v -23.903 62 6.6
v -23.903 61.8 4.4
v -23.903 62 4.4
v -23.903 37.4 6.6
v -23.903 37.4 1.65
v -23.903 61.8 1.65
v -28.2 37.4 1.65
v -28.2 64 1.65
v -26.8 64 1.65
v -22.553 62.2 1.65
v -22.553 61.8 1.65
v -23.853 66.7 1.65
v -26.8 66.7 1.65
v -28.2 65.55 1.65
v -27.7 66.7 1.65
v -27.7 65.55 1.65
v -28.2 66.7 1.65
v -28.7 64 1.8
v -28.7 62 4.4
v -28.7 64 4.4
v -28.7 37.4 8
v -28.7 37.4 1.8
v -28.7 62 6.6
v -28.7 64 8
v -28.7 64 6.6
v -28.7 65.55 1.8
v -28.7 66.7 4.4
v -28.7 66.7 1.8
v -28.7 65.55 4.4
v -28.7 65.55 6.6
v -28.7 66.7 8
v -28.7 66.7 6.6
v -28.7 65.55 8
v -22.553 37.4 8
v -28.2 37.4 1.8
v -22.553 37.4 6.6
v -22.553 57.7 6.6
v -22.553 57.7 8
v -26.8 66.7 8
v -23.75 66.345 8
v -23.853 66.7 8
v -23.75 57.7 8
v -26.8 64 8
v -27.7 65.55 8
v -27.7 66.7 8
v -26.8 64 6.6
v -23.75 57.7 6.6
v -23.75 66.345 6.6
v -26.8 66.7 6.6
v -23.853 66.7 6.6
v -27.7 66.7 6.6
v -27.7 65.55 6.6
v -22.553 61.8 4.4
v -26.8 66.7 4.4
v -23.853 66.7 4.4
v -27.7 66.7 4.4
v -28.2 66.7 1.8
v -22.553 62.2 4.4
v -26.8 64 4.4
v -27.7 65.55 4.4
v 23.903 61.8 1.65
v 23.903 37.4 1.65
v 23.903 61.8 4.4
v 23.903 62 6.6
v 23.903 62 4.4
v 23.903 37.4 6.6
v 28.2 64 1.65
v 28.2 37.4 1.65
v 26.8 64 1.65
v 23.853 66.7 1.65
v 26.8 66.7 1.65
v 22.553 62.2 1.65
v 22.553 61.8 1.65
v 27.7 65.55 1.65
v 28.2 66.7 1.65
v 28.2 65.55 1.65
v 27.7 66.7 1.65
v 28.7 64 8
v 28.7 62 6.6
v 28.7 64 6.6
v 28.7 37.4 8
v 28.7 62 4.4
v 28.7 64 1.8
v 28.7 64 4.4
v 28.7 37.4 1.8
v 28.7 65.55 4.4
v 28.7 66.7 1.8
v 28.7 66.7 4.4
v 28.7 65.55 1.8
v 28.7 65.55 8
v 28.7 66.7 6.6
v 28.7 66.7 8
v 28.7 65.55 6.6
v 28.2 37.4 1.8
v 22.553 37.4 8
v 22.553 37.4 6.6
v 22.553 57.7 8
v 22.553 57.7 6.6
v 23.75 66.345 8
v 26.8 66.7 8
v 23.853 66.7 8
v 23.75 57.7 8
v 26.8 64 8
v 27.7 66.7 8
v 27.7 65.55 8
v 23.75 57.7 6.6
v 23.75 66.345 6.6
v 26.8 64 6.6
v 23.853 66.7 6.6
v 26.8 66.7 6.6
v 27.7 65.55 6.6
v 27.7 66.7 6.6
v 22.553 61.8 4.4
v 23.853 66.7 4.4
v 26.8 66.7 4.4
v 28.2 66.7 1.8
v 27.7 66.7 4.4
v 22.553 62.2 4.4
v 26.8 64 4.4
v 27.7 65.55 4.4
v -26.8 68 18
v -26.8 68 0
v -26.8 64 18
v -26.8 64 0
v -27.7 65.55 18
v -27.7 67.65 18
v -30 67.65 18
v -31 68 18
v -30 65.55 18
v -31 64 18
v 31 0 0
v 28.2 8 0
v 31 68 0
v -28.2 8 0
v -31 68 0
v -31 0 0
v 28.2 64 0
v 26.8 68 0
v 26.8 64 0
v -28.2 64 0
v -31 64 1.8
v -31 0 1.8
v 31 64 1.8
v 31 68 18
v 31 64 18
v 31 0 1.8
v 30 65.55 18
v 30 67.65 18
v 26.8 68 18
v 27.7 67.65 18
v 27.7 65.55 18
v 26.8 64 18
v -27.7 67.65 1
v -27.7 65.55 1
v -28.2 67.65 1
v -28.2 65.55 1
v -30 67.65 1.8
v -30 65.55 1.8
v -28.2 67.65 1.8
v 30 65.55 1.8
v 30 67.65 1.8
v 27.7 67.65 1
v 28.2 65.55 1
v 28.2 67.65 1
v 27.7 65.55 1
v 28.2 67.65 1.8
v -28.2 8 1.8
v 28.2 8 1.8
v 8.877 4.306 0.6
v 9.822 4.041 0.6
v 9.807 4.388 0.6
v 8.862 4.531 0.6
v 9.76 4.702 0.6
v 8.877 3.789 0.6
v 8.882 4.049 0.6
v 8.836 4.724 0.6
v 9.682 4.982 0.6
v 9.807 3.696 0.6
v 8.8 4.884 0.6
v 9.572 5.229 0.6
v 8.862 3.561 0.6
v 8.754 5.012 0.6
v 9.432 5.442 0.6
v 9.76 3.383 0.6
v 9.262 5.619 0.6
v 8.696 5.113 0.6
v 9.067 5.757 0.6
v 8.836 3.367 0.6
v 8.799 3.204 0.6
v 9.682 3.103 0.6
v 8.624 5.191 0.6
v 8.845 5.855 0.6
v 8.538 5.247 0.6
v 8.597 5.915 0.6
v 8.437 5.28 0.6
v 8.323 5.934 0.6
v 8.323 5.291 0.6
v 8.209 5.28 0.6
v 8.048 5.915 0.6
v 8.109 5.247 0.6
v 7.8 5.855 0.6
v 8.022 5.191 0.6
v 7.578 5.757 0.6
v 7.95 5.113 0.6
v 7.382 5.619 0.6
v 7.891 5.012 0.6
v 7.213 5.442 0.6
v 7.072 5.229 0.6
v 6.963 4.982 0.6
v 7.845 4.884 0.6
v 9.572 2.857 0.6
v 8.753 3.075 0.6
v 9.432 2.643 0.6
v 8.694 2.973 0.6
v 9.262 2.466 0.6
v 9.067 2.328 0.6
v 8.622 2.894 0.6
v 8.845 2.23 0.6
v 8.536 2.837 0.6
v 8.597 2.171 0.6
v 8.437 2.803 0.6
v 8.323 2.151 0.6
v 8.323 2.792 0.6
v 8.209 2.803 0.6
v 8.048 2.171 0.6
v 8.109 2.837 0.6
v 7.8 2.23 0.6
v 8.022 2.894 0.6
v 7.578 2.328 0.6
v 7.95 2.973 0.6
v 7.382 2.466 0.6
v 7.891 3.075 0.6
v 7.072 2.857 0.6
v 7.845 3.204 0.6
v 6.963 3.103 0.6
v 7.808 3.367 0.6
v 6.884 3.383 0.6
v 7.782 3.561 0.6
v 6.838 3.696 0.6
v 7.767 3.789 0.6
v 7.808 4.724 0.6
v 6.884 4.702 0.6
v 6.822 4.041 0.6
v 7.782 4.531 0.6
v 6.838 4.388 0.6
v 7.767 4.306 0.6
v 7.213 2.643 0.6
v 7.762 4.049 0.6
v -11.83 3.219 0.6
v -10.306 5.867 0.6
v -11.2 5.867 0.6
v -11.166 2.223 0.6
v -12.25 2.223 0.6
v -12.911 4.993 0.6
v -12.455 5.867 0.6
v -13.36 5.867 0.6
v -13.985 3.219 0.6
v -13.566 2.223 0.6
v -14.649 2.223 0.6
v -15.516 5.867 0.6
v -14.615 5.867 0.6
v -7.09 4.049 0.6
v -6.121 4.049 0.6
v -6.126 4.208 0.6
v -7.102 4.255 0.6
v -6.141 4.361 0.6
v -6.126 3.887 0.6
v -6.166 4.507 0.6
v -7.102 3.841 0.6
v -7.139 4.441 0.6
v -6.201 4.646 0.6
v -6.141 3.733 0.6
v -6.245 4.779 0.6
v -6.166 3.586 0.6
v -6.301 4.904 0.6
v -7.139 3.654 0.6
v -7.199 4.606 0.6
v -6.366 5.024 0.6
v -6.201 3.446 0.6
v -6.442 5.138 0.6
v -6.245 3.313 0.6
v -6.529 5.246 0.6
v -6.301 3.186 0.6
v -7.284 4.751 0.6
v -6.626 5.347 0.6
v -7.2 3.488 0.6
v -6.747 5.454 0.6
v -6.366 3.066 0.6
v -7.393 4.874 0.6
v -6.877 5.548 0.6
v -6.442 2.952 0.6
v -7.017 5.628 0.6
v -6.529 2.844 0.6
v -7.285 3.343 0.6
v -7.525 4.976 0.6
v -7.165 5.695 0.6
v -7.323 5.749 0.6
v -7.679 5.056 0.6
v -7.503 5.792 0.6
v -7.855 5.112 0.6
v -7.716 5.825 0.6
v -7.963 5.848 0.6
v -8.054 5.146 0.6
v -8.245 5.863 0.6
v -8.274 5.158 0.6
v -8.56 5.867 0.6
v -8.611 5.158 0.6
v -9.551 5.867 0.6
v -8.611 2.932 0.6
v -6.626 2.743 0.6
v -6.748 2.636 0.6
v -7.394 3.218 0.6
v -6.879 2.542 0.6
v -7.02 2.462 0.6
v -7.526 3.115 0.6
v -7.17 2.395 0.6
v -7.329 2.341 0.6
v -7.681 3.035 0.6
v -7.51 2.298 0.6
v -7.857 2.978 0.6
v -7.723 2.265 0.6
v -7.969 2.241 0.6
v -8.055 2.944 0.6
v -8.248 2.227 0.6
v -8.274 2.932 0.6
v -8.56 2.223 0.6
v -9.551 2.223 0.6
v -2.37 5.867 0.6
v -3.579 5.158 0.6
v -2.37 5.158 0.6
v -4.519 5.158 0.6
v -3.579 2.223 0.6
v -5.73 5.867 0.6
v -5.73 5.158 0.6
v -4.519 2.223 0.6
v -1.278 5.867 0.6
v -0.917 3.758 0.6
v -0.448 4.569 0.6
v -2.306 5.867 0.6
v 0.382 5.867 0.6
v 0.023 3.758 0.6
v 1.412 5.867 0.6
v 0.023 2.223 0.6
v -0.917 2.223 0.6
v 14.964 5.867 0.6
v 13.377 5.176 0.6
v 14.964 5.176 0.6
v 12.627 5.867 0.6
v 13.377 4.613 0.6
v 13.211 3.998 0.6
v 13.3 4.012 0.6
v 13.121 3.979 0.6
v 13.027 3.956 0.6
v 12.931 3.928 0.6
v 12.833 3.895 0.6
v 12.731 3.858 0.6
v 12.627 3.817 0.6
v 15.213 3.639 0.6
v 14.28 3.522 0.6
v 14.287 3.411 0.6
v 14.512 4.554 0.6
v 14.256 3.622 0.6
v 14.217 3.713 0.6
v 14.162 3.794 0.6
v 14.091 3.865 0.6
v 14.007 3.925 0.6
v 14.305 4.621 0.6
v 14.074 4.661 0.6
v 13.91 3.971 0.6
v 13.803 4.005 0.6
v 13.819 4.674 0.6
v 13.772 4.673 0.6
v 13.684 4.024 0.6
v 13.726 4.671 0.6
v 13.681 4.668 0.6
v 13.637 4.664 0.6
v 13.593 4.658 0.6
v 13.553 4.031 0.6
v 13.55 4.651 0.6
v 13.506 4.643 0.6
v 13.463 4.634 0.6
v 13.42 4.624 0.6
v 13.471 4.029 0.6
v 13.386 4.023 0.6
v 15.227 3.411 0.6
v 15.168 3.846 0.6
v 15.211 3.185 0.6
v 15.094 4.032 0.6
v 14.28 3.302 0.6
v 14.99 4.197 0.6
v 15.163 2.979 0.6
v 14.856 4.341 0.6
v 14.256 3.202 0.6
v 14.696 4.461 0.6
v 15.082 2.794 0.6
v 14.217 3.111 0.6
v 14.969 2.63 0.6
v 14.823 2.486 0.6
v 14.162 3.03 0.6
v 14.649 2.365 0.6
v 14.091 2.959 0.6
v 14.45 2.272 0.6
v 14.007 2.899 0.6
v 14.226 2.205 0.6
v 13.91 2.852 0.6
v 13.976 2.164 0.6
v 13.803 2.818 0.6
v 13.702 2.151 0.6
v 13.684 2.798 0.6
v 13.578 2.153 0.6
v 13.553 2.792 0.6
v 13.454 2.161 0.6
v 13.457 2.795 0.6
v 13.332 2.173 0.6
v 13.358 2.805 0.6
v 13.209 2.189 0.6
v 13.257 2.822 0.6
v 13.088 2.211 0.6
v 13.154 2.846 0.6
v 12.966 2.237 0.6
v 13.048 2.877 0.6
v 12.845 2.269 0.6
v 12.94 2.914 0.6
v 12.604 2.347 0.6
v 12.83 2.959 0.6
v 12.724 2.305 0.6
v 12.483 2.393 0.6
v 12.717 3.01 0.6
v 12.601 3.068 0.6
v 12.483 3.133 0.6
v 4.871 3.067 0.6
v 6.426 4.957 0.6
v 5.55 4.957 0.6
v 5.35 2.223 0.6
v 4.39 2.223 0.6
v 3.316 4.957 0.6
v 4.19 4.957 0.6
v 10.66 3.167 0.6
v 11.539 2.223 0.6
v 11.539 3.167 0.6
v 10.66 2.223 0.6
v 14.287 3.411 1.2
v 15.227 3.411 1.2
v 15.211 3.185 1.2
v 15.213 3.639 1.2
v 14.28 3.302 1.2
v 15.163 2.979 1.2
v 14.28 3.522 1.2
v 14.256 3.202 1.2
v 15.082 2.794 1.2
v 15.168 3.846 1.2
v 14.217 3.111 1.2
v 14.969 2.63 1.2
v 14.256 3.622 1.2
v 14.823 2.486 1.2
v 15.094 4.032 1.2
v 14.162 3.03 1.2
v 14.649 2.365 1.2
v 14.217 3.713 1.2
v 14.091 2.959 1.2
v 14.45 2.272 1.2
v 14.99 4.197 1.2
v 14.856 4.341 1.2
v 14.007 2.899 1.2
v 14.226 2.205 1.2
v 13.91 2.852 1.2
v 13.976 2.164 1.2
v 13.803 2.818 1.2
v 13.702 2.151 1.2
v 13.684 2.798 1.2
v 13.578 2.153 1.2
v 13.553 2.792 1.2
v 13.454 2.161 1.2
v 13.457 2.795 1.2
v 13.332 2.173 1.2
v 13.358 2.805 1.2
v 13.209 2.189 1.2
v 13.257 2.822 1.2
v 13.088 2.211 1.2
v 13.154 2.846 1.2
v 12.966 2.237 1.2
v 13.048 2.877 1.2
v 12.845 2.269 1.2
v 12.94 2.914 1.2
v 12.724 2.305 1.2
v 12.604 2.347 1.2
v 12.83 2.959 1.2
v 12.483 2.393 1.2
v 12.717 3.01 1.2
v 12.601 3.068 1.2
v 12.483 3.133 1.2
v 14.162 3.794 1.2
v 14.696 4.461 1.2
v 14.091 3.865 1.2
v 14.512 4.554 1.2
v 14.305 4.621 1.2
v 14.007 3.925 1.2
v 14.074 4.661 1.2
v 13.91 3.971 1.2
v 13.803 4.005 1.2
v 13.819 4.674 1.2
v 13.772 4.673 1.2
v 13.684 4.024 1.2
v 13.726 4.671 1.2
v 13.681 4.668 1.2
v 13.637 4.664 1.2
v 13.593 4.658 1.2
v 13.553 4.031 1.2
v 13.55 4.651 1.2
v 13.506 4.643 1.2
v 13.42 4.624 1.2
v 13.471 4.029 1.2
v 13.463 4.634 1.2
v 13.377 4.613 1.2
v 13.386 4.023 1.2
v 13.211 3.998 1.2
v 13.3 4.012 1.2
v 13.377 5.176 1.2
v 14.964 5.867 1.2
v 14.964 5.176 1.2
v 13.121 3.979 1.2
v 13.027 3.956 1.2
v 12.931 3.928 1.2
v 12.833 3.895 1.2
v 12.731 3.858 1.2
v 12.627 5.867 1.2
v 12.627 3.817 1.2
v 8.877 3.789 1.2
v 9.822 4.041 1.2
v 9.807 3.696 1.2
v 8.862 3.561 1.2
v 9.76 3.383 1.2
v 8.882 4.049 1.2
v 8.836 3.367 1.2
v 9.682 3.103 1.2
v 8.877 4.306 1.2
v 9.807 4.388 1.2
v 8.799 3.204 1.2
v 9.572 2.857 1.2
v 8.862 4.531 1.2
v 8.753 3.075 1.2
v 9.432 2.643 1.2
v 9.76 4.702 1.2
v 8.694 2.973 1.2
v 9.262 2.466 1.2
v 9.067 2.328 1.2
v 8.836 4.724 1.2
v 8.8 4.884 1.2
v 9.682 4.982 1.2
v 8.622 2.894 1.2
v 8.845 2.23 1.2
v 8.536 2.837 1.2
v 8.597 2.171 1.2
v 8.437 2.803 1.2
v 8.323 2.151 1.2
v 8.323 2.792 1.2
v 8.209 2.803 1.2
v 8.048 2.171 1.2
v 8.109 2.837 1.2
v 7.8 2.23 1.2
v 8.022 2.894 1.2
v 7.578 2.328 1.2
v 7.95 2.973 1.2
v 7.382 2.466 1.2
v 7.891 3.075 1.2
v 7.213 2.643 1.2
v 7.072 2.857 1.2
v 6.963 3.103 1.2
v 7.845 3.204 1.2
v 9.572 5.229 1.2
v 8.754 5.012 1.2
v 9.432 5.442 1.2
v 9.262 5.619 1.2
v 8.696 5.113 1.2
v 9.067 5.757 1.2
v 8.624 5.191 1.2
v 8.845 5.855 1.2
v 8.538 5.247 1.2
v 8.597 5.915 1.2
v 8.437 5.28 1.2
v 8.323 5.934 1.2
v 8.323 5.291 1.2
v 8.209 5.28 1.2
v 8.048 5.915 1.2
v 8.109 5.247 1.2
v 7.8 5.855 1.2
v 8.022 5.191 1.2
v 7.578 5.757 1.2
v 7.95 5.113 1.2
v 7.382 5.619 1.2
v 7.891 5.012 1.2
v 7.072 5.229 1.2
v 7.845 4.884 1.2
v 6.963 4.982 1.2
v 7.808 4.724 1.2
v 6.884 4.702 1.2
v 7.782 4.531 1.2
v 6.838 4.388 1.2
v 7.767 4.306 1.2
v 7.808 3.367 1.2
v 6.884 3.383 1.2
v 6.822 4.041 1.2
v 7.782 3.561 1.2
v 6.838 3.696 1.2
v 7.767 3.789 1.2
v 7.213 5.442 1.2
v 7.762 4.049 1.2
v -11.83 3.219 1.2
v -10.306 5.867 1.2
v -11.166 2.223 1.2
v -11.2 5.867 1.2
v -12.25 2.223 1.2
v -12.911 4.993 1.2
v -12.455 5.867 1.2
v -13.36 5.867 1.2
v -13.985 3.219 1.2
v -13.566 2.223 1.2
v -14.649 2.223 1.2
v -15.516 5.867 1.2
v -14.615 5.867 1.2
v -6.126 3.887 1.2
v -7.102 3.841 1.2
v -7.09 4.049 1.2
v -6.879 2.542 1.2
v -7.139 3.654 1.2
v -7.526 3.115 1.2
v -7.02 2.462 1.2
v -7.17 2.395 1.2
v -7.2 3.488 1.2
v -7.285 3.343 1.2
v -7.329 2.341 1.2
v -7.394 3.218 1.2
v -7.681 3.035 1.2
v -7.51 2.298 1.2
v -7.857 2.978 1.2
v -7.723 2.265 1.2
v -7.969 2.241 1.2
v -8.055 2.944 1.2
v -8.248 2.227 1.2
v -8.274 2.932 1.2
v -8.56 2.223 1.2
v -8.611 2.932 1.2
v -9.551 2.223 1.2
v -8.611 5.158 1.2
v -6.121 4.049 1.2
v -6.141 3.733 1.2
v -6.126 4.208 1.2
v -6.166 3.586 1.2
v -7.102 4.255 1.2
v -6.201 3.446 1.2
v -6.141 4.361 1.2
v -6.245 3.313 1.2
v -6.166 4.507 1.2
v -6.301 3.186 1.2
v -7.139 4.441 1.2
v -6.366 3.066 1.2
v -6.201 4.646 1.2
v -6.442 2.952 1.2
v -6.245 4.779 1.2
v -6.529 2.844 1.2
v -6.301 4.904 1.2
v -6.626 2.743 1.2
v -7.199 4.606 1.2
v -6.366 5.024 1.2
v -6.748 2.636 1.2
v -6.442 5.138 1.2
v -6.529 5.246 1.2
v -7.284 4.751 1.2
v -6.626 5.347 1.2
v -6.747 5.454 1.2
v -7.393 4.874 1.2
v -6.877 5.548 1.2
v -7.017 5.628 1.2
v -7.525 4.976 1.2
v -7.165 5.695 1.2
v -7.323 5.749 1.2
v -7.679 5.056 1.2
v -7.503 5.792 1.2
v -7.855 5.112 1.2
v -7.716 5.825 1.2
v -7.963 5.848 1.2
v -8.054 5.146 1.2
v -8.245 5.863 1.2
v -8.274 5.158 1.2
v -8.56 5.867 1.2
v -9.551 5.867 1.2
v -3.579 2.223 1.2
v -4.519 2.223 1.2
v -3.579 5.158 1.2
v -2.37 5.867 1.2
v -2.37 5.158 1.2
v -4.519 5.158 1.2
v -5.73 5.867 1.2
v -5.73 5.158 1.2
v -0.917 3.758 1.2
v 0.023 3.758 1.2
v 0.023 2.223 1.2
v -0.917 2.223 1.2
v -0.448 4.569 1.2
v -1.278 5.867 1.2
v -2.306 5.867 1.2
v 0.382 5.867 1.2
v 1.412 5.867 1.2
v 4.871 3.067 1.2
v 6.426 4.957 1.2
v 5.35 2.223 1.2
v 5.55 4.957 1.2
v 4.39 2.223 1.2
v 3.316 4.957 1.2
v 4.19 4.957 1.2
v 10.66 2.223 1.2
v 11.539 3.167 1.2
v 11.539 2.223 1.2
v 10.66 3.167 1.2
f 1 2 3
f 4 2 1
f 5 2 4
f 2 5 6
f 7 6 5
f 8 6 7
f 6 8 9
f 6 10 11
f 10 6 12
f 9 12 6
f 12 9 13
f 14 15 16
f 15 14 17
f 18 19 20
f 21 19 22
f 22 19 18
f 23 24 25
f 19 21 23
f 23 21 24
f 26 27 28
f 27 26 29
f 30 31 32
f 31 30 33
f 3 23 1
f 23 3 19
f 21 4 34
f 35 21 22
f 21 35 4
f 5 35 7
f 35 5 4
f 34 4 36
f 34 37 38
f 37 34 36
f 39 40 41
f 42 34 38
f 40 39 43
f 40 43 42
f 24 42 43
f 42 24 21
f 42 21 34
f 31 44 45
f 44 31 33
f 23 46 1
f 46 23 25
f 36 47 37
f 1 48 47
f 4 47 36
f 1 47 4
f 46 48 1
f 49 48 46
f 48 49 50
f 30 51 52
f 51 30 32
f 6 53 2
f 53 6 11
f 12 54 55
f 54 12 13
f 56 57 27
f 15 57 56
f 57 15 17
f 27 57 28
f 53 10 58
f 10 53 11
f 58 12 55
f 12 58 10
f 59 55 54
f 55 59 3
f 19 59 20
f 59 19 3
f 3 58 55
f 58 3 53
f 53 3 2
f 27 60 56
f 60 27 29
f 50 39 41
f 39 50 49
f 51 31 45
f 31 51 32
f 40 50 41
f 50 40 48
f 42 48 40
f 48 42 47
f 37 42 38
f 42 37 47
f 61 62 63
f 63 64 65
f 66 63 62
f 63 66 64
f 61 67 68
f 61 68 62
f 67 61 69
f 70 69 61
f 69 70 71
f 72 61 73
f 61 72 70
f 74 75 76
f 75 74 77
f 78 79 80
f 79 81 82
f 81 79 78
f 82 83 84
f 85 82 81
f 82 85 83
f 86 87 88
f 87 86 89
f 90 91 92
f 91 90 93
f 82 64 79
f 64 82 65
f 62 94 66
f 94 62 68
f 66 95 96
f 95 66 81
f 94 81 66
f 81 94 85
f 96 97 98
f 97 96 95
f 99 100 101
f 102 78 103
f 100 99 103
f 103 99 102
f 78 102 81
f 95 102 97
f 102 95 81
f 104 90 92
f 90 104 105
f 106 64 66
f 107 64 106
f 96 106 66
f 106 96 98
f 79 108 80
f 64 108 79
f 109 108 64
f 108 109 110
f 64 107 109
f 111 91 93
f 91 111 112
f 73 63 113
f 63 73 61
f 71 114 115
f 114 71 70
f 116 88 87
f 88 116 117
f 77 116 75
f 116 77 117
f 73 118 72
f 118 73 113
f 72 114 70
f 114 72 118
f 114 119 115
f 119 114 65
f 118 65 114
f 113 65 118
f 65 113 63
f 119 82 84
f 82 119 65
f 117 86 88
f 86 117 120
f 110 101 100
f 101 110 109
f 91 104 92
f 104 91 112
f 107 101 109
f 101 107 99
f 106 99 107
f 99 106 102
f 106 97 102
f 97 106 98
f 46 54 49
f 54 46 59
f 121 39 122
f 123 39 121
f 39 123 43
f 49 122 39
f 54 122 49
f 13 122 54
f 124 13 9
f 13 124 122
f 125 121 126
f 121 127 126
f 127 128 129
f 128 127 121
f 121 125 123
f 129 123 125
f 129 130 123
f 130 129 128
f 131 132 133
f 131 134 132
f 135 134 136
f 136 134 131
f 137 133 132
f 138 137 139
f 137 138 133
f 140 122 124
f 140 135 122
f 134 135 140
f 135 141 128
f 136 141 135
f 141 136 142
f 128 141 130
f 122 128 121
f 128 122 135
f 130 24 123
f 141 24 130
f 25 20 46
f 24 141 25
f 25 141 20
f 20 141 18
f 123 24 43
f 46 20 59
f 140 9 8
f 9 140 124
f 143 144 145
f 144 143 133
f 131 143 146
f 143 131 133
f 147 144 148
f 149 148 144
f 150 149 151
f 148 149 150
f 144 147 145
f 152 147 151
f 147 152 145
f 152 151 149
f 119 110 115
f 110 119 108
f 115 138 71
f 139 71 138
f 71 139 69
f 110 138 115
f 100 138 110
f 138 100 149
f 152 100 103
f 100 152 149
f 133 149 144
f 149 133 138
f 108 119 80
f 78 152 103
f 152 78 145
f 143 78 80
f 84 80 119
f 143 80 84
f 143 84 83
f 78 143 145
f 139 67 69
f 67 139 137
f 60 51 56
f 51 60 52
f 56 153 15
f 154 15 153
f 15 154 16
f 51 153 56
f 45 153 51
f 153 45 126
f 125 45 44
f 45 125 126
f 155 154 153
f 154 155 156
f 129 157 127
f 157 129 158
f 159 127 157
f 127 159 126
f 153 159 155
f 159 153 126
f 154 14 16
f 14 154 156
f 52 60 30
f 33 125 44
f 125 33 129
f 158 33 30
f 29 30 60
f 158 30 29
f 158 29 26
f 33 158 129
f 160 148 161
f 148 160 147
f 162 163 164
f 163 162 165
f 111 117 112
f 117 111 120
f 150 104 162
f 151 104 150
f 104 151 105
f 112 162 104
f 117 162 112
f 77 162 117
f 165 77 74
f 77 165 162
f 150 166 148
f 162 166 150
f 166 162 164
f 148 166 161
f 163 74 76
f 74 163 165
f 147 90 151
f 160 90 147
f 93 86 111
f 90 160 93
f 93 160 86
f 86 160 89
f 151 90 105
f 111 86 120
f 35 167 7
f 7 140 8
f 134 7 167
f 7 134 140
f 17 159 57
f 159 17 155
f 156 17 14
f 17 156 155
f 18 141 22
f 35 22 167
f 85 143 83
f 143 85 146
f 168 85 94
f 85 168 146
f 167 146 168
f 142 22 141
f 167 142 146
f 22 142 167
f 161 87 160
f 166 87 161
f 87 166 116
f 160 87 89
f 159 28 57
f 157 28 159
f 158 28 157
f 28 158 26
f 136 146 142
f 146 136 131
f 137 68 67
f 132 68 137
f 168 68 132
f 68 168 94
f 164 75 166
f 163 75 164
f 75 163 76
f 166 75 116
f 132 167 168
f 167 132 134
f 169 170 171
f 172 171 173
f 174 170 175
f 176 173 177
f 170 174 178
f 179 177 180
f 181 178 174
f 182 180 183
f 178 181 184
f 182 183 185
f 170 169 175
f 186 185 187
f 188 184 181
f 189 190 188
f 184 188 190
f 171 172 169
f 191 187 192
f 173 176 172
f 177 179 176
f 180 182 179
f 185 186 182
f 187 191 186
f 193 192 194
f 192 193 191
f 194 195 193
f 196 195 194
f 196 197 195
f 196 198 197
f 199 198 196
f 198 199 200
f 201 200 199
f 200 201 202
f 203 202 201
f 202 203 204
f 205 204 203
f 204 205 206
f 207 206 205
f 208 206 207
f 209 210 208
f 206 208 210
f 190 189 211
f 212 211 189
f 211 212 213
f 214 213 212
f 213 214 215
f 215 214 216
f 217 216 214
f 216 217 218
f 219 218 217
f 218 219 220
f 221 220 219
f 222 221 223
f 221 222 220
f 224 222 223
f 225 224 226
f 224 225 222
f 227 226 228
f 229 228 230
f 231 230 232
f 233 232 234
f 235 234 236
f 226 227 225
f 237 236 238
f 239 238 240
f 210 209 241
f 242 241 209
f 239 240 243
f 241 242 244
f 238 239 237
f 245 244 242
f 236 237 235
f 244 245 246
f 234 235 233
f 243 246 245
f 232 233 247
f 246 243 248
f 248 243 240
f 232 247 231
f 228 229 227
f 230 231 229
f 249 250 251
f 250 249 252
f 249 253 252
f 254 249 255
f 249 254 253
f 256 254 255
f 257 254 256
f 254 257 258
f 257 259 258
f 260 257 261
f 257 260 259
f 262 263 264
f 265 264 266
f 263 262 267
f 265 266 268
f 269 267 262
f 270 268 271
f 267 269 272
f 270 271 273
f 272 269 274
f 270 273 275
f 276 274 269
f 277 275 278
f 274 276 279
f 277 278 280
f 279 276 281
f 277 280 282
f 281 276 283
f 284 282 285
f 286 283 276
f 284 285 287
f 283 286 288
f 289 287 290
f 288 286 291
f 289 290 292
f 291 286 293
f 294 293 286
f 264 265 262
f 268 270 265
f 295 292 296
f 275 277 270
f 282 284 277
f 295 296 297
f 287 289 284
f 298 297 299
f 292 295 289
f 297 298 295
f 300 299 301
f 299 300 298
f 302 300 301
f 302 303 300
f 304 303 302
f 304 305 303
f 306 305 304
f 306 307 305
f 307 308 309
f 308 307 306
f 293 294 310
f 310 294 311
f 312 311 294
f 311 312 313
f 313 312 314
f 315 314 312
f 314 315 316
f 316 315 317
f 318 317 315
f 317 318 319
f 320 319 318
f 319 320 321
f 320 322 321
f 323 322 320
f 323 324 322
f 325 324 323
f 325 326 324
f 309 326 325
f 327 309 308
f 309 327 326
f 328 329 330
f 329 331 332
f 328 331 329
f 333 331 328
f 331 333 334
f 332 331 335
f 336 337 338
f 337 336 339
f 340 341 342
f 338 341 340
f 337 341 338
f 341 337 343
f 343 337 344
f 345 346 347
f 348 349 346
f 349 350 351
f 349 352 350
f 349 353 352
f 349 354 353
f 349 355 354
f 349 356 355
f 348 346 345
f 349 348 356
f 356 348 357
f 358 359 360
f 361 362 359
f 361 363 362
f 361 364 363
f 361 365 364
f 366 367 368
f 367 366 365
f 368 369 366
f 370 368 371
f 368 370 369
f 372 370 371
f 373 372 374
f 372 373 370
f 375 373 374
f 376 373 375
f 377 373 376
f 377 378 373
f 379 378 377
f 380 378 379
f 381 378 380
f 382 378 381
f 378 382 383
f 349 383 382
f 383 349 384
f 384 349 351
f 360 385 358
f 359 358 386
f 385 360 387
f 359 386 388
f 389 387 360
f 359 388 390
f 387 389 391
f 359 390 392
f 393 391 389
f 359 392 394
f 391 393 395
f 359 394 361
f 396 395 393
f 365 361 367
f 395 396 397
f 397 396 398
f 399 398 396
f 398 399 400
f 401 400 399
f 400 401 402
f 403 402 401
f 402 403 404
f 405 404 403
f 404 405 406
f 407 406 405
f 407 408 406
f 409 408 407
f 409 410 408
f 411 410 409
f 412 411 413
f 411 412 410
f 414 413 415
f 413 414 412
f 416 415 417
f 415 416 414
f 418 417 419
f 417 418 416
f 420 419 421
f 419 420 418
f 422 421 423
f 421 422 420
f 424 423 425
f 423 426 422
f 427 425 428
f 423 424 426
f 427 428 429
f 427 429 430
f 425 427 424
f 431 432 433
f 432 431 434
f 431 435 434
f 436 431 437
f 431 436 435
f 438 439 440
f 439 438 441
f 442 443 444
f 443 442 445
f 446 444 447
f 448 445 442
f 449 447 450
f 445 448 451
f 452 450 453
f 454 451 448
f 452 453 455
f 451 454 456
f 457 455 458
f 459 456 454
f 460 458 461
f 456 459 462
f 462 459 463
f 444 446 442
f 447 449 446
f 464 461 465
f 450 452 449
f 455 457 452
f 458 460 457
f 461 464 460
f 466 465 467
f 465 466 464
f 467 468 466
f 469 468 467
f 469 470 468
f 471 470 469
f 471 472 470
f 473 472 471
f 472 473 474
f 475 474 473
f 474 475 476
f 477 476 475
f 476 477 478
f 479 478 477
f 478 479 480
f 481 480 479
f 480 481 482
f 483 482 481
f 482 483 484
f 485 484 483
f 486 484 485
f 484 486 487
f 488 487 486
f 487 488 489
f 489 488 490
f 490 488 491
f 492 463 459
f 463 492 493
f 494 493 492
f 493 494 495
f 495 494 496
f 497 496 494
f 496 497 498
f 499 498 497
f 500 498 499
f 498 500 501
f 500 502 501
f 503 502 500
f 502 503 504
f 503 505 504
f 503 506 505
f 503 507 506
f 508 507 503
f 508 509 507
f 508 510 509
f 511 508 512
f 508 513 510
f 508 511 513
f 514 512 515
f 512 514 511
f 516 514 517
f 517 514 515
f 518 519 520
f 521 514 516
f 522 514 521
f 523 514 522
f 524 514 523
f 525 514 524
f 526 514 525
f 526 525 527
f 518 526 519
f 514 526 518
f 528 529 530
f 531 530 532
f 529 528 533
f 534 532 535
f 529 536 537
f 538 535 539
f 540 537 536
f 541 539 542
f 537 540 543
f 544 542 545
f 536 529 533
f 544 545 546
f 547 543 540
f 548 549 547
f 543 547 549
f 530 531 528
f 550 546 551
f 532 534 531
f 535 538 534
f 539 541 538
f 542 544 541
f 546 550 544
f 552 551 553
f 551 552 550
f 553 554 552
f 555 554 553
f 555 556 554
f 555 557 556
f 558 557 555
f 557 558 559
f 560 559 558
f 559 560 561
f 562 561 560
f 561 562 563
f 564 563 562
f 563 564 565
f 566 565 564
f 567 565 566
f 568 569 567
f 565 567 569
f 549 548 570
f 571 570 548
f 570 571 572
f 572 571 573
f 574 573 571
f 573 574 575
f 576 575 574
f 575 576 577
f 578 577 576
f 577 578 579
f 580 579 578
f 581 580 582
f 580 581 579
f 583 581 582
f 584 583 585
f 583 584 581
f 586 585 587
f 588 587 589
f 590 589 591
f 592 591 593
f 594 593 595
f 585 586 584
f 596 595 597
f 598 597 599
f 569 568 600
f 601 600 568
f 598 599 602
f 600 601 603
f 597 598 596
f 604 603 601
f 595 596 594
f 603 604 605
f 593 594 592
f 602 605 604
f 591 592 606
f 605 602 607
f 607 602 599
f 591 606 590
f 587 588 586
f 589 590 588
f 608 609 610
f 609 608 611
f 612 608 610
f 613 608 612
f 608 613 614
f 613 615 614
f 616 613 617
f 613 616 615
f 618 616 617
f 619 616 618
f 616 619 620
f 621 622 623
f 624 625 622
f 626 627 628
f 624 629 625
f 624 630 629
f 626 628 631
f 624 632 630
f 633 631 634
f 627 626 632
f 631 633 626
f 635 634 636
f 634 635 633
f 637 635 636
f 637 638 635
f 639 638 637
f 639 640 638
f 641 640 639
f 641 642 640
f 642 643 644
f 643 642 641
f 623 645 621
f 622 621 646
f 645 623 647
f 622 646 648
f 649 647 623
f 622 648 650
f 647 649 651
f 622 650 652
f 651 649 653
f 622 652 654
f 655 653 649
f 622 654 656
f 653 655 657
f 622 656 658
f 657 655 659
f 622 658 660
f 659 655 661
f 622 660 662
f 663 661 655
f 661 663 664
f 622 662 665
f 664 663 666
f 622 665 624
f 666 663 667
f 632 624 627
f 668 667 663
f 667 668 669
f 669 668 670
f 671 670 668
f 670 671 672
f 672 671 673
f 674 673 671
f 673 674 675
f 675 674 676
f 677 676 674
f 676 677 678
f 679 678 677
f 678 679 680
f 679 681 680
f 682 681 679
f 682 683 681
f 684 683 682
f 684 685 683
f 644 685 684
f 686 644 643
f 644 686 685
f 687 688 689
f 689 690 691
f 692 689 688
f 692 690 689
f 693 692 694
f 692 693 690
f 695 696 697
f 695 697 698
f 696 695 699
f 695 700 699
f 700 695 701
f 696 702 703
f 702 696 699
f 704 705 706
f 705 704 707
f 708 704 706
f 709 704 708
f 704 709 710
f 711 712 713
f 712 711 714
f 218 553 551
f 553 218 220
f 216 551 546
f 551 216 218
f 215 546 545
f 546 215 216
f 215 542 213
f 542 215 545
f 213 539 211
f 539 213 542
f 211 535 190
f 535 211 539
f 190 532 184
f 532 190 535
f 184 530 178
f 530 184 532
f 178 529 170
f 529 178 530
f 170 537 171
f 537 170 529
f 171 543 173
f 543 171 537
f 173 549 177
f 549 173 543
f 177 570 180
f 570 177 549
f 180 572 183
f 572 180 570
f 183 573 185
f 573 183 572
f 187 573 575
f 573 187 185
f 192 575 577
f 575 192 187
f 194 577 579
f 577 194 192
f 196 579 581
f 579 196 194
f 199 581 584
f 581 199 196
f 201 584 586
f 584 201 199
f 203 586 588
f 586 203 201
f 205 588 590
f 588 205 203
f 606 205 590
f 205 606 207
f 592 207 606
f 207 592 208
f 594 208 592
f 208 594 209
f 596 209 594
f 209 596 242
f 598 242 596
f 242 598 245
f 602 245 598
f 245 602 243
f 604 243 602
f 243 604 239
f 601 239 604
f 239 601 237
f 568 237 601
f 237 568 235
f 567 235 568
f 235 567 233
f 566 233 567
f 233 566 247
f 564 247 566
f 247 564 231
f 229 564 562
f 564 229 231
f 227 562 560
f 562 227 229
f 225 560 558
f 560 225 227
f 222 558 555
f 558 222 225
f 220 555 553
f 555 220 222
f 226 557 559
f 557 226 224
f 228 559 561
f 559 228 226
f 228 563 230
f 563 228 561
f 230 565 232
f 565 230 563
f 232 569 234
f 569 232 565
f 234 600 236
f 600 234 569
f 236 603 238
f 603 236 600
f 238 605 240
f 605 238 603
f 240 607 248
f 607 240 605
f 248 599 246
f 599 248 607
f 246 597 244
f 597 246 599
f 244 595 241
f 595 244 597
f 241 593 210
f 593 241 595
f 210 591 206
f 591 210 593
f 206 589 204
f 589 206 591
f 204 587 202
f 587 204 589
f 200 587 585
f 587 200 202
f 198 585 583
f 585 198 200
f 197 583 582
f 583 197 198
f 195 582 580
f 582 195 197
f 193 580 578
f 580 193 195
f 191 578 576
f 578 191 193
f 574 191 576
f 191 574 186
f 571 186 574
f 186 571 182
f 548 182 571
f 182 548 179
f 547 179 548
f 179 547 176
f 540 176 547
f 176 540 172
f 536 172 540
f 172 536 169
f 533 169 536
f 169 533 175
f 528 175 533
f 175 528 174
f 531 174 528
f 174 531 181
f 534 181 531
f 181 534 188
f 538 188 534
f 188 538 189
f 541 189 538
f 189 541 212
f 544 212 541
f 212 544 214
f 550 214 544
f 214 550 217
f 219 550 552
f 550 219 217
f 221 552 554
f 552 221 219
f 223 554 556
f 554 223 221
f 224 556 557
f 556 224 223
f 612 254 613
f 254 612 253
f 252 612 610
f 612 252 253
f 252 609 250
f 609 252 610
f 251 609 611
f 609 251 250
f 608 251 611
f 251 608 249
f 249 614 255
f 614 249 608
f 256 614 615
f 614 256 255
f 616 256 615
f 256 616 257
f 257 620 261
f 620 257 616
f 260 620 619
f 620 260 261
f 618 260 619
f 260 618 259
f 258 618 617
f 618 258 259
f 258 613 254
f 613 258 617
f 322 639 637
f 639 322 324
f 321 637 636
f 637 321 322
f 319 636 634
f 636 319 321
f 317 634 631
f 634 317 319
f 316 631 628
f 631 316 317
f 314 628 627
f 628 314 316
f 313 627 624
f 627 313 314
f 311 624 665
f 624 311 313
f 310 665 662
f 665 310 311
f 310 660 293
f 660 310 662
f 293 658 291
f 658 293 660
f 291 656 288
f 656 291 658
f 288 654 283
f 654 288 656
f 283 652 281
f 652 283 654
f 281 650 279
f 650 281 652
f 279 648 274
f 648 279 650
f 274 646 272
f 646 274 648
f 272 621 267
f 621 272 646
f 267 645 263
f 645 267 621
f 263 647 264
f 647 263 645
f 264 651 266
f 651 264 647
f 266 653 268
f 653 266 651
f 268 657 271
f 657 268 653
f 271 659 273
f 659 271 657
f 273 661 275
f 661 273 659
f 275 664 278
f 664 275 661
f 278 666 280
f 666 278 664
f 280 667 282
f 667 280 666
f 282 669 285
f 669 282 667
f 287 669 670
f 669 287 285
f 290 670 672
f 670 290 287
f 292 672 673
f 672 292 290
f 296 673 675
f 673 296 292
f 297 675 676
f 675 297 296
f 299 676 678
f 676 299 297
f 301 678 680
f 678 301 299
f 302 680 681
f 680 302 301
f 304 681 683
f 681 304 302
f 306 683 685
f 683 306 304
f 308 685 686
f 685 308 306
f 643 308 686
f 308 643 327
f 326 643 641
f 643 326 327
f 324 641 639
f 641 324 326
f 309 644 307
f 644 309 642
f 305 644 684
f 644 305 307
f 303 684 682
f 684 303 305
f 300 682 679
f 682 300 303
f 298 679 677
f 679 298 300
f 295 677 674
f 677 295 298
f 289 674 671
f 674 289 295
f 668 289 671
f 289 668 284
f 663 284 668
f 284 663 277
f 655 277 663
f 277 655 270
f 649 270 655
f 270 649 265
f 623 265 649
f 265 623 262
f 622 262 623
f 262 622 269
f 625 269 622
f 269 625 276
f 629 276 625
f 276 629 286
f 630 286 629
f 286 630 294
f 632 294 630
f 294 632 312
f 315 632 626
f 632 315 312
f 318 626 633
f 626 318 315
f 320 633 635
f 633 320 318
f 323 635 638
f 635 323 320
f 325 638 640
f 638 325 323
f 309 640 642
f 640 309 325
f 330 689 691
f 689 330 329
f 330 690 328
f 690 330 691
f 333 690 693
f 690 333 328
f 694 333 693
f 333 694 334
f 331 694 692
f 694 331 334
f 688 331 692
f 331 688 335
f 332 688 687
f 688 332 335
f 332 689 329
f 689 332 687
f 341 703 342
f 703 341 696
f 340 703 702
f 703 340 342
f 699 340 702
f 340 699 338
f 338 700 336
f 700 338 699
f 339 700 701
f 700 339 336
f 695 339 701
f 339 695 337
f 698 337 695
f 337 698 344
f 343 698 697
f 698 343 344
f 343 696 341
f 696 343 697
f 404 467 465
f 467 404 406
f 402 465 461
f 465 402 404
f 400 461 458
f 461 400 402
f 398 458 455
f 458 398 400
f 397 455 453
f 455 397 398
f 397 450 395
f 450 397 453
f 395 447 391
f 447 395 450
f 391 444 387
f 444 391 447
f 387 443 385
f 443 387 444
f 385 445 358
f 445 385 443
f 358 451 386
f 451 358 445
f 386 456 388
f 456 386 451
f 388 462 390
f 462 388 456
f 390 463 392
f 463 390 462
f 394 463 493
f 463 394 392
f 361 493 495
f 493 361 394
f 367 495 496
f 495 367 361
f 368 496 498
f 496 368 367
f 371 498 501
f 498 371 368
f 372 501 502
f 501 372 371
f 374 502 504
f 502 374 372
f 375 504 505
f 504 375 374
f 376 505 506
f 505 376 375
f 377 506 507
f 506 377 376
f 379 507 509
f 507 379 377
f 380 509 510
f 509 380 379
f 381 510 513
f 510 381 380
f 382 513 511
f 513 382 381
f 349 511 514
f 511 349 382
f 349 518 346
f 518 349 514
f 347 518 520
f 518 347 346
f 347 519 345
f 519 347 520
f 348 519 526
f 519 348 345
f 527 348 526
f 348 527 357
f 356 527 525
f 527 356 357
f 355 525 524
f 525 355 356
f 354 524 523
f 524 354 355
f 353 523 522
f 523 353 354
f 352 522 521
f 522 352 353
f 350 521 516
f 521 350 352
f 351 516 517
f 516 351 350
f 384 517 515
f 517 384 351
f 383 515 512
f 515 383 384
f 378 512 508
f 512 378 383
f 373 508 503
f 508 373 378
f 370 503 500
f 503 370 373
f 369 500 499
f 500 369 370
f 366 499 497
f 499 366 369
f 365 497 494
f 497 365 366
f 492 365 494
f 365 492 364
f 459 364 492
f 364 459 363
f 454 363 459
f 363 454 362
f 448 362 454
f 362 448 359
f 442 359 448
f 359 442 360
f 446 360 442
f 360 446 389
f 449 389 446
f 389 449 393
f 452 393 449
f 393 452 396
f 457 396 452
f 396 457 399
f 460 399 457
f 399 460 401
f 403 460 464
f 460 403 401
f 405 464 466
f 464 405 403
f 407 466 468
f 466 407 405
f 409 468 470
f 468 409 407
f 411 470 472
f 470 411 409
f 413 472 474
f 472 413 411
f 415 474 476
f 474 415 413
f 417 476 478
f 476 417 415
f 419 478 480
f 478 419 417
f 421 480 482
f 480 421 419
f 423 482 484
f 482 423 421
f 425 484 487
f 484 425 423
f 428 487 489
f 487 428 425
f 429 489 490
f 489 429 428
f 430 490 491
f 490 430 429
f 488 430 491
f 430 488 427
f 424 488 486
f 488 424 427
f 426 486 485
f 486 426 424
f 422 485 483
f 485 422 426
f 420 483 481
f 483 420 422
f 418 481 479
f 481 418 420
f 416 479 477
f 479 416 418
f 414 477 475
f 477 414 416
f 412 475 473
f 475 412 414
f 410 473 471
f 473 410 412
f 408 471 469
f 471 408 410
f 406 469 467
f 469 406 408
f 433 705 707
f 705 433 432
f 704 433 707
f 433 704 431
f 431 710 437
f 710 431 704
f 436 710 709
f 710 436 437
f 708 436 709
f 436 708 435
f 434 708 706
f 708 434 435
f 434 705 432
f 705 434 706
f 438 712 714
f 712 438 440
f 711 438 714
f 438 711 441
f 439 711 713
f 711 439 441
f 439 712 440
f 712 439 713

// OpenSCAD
// v0.5 rear-bay fit test for the iodeo ESP Minitel V2 JST board.
// Units: mm. This fixture validates insertion and cable routing before the
// geometry is integrated into another full Minitel body print.

include <../../../../src/pcb_reference.scad>

part = "fixture"; // fixture, coupon, retainer, retainer_assembly, pcb, pcb_bare, components, cable, assembly, position_interference, route_interference
sweep_offset = 0;
$fn = 36;

// Measured hardware and Gerber-derived board dimensions.
pcb_length = 47.10521;
pcb_depth = 36.21792;
pcb_thickness = 1.60;
populated_height = 10.40;

// The USB-C side is the rear/trailing edge. Its metal shell is modelled as
// projecting 4 mm beyond the PCB for routing review, not as a fit datum.
pcb_rear_y = 60.0;
usb_outer_y = 64.0;
loop_front_y = 4.0;
route_depth = usb_outer_y - loop_front_y; // owner-selected 60 mm

pcb_z = 4.70;
slot_vertical_clearance = 0.30;
slot_side_clearance = 0.35;
// One millimetre is enough to carry the 1.6 mm PCB edge while keeping the
// nearby ESP32 module clear on the underside.
edge_capture = 1.00;

// Creality K2 baseline: 0.4 mm nozzle and 0.20 mm layers. Structural walls
// are multiples of practical line widths; the hidden mark spans three layers.
fixture_half_w = 31.0;
fixture_front_y = 0.0;
fixture_rear_y = 68.0;
base_h = 1.80;
rail_front_y = 37.40;
rail_rear_y = 62.00;
rail_mouth_y = 66.50;
rail_top_z = 8.00;
rail_outer_x = 28.70;

// Provisional until the cable is measured. The open fixture remains usable
// with a larger cable; this value controls only the visual routing reference.
cable_d = 5.0;
cable_z = rail_top_z + cable_d/2 + 0.20;

watermark_text = "WDTY v0.5";
watermark_z = 0.60;
watermark_h = 0.60;

board_edge_x = pcb_length/2;
slot_wall_x = board_edge_x + slot_side_clearance;
lip_inner_x = board_edge_x - edge_capture;
slot_bottom_z = pcb_z - slot_vertical_clearance;
slot_top_z = pcb_z + pcb_thickness + slot_vertical_clearance;

module placed_pcb(offset_y=0, thickness=pcb_thickness) {
    // Gerber (x,y) -> fixture (y,x): the USB/JST axis becomes front-to-rear.
    translate([-pcb_length/2, pcb_rear_y-18.11024+offset_y, pcb_z])
        mirror([1,0,0]) rotate([0,0,90])
            linear_extrude(height=thickness) pcb_reference_2d();
}

module left_rail(y0=rail_front_y, y1=rail_rear_y, mouth_y=rail_mouth_y) {
    // C-channel facing the PCB. Only the bare board edge enters the slot.
    difference() {
        union() {
            translate([-rail_outer_x,y0,base_h-0.15]) cube([rail_outer_x-slot_wall_x,y1-y0,slot_bottom_z-base_h+0.15]);
            translate([-rail_outer_x,y0,slot_top_z]) cube([rail_outer_x-lip_inner_x,y1-y0,rail_top_z-slot_top_z]);
            translate([-rail_outer_x,y0,slot_bottom_z]) cube([rail_outer_x-slot_wall_x,y1-y0,slot_top_z-slot_bottom_z]);

            // A flared mouth helps the broad USB-side edge find both slots.
            hull() {
                translate([-rail_outer_x,y1-0.20,base_h-0.15]) cube([rail_outer_x-lip_inner_x,0.40,slot_bottom_z-base_h+0.15]);
                translate([-rail_outer_x,mouth_y-0.20,base_h-0.15]) cube([rail_outer_x-(lip_inner_x+1.30),0.40,slot_bottom_z-base_h+0.15]);
            }
            hull() {
                translate([-rail_outer_x,y1-0.20,slot_top_z]) cube([rail_outer_x-lip_inner_x,0.40,rail_top_z-slot_top_z]);
                translate([-rail_outer_x,mouth_y-0.20,slot_top_z]) cube([rail_outer_x-(lip_inner_x+1.30),0.40,rail_top_z-slot_top_z]);
            }
        }

        // RESET sits very close to this board edge. This window keeps its
        // entire insertion path free while the remaining lip retains the PCB.
        translate([-23.75,57.70,slot_top_z-0.10])
            cube([4.75,mouth_y-57.50,rail_top_z-slot_top_z+0.20]);
    }
}

module right_rail(y0=rail_front_y, y1=rail_rear_y, mouth_y=rail_mouth_y) {
    mirror([1,0,0]) left_rail(y0,y1,mouth_y);
}

module rear_sockets() {
    // Vertical grooves accept the removable retainer after PCB insertion.
    difference() {
        union() {
            translate([-fixture_half_w,64.0,0]) cube([4.2,4.0,18.0]);
            translate([fixture_half_w-4.2,64.0,0]) cube([4.2,4.0,18.0]);
        }
        translate([-fixture_half_w+1.0,65.55,1.0]) cube([2.3,2.10,18.0]);
        translate([fixture_half_w-3.3,65.55,1.0]) cube([2.3,2.10,18.0]);
    }
}

module hidden_watermark(y=4.0) {
    // Enclosed void: 3 x 0.20 mm layers below, in, and above the mark.
    translate([0,y,watermark_z])
        linear_extrude(height=watermark_h)
            text(watermark_text,size=3.6,font="DejaVu Sans:style=Bold",
                 halign="center",valign="center",spacing=1.05);
}

module fixture_v05() {
    difference() {
        union() {
            // Open U-frame: no carrier plate beneath the PCB.
            translate([-fixture_half_w,fixture_front_y,0]) cube([2.80,fixture_rear_y,base_h]);
            translate([fixture_half_w-2.80,fixture_front_y,0]) cube([2.80,fixture_rear_y,base_h]);
            translate([-fixture_half_w,fixture_front_y,0]) cube([2*fixture_half_w,8.00,base_h]);
            left_rail();
            right_rail();
            rear_sockets();
        }
        hidden_watermark();
    }
}

module guide_coupon_v05() {
    // A short, low-filament test of the 47.105 mm board width and 2.20 mm slot.
    translate([0,-37.4,0]) difference() {
        union() {
            left_rail(37.4,49.4,53.9);
            right_rail(37.4,49.4,53.9);
            translate([-28.7,37.4,0]) cube([57.4,6.0,base_h]);
        }
        hidden_watermark(40.4);
    }
}

module retainer_v05() {
    // Slides down into the rear grooves. The centre stays open for USB-C,
    // RESET and laying in the attached cable/DIN lead.
    union() {
        translate([-29.75,65.70,1.0]) cube([1.80,1.80,16.0]);
        translate([27.95,65.70,1.0]) cube([1.80,1.80,16.0]);
        translate([-29.75,65.70,14.0]) cube([59.50,1.80,3.0]);

        // One stop finger bears on a connector-free end of the PCB rear edge.
        translate([16.5,60.20,slot_bottom_z])
            cube([3.0,6.40,slot_top_z-slot_bottom_z]);
        translate([16.5,65.70,slot_bottom_z])
            cube([3.0,1.80,14.0-slot_bottom_z+0.10]);
    }
}

module printable_retainer_v05() {
    // Rotate the rear face onto the build plate. The stop becomes an upright
    // printable rib and needs no generated support.
    translate([0,-1.0,67.50]) rotate([-90,0,0]) retainer_v05();
}

module component_envelopes(offset_y=0) {
    // Conservative photo-derived visual envelopes. They deliberately do not
    // claim exact component placement; only the measured 10.4 mm total height
    // and obvious USB/JST/ESP32 sides are represented.
    // ESP32 module below the board.
    translate([-22.0,43.0+offset_y,1.00]) cube([20.0,14.0,pcb_z-1.00]);
    // USB-C shell at the rear.
    translate([-15.5,pcb_rear_y-2.0+offset_y,pcb_z+pcb_thickness])
        cube([8.5,usb_outer_y-pcb_rear_y+2.0,3.2]);
    // RESET switch beside USB-C.
    translate([-22.7,pcb_rear_y-1.7+offset_y,pcb_z+pcb_thickness]) cube([3.6,3.2,2.3]);
    // JST connector and inserted plug at the front of the populated board.
    translate([-2.0,18.8+offset_y,pcb_z+pcb_thickness]) cube([11.0,8.0,5.10]);
}

module cable_node(p) { translate([p[0],p[1],cable_z]) sphere(d=cable_d); }
module cable_segment(a,b) { hull() { cable_node(a); cable_node(b); } }
module cable_reference() {
    // Cable is already attached before insertion. It leaves the JST toward
    // the front, makes the requested relaxed bend and returns above the right
    // guide rail to the open rear face.
    pts = [[3.5,19.0],[3.5,9.0],[8.0,4.0],[18.0,4.0],[24.0,10.0],[24.0,68.0]];
    for(i=[0:len(pts)-2]) cable_segment(pts[i],pts[i+1]);
}

module assembly_v05() {
    color("#d8c7a7") fixture_v05();
    color("#cf7b35") retainer_v05();
    color("#10201b") placed_pcb();
    color("#a9aaa6") component_envelopes();
    color("#222222") cable_reference();
}

if(part=="fixture") fixture_v05();
else if(part=="coupon") guide_coupon_v05();
else if(part=="retainer") printable_retainer_v05();
else if(part=="retainer_assembly") retainer_v05();
else if(part=="pcb") { placed_pcb(); component_envelopes(); }
else if(part=="pcb_bare") placed_pcb();
else if(part=="components") component_envelopes();
else if(part=="cable") cable_reference();
else if(part=="assembly") assembly_v05();
else if(part=="position_interference") intersection() {
    fixture_v05();
    union() {
        placed_pcb(sweep_offset);
        component_envelopes(sweep_offset);
    }
}
else if(part=="board_position_interference") intersection() {
    fixture_v05();
    placed_pcb(sweep_offset);
}
else if(part=="component_position_interference") intersection() {
    fixture_v05();
    component_envelopes(sweep_offset);
}
else if(part=="route_interference") intersection() {
    fixture_v05();
    union() { component_envelopes(); cable_reference(); }
}
else if(part=="retainer_interference") intersection() {
    retainer_v05();
    union() { placed_pcb(); component_envelopes(); cable_reference(); }
}
